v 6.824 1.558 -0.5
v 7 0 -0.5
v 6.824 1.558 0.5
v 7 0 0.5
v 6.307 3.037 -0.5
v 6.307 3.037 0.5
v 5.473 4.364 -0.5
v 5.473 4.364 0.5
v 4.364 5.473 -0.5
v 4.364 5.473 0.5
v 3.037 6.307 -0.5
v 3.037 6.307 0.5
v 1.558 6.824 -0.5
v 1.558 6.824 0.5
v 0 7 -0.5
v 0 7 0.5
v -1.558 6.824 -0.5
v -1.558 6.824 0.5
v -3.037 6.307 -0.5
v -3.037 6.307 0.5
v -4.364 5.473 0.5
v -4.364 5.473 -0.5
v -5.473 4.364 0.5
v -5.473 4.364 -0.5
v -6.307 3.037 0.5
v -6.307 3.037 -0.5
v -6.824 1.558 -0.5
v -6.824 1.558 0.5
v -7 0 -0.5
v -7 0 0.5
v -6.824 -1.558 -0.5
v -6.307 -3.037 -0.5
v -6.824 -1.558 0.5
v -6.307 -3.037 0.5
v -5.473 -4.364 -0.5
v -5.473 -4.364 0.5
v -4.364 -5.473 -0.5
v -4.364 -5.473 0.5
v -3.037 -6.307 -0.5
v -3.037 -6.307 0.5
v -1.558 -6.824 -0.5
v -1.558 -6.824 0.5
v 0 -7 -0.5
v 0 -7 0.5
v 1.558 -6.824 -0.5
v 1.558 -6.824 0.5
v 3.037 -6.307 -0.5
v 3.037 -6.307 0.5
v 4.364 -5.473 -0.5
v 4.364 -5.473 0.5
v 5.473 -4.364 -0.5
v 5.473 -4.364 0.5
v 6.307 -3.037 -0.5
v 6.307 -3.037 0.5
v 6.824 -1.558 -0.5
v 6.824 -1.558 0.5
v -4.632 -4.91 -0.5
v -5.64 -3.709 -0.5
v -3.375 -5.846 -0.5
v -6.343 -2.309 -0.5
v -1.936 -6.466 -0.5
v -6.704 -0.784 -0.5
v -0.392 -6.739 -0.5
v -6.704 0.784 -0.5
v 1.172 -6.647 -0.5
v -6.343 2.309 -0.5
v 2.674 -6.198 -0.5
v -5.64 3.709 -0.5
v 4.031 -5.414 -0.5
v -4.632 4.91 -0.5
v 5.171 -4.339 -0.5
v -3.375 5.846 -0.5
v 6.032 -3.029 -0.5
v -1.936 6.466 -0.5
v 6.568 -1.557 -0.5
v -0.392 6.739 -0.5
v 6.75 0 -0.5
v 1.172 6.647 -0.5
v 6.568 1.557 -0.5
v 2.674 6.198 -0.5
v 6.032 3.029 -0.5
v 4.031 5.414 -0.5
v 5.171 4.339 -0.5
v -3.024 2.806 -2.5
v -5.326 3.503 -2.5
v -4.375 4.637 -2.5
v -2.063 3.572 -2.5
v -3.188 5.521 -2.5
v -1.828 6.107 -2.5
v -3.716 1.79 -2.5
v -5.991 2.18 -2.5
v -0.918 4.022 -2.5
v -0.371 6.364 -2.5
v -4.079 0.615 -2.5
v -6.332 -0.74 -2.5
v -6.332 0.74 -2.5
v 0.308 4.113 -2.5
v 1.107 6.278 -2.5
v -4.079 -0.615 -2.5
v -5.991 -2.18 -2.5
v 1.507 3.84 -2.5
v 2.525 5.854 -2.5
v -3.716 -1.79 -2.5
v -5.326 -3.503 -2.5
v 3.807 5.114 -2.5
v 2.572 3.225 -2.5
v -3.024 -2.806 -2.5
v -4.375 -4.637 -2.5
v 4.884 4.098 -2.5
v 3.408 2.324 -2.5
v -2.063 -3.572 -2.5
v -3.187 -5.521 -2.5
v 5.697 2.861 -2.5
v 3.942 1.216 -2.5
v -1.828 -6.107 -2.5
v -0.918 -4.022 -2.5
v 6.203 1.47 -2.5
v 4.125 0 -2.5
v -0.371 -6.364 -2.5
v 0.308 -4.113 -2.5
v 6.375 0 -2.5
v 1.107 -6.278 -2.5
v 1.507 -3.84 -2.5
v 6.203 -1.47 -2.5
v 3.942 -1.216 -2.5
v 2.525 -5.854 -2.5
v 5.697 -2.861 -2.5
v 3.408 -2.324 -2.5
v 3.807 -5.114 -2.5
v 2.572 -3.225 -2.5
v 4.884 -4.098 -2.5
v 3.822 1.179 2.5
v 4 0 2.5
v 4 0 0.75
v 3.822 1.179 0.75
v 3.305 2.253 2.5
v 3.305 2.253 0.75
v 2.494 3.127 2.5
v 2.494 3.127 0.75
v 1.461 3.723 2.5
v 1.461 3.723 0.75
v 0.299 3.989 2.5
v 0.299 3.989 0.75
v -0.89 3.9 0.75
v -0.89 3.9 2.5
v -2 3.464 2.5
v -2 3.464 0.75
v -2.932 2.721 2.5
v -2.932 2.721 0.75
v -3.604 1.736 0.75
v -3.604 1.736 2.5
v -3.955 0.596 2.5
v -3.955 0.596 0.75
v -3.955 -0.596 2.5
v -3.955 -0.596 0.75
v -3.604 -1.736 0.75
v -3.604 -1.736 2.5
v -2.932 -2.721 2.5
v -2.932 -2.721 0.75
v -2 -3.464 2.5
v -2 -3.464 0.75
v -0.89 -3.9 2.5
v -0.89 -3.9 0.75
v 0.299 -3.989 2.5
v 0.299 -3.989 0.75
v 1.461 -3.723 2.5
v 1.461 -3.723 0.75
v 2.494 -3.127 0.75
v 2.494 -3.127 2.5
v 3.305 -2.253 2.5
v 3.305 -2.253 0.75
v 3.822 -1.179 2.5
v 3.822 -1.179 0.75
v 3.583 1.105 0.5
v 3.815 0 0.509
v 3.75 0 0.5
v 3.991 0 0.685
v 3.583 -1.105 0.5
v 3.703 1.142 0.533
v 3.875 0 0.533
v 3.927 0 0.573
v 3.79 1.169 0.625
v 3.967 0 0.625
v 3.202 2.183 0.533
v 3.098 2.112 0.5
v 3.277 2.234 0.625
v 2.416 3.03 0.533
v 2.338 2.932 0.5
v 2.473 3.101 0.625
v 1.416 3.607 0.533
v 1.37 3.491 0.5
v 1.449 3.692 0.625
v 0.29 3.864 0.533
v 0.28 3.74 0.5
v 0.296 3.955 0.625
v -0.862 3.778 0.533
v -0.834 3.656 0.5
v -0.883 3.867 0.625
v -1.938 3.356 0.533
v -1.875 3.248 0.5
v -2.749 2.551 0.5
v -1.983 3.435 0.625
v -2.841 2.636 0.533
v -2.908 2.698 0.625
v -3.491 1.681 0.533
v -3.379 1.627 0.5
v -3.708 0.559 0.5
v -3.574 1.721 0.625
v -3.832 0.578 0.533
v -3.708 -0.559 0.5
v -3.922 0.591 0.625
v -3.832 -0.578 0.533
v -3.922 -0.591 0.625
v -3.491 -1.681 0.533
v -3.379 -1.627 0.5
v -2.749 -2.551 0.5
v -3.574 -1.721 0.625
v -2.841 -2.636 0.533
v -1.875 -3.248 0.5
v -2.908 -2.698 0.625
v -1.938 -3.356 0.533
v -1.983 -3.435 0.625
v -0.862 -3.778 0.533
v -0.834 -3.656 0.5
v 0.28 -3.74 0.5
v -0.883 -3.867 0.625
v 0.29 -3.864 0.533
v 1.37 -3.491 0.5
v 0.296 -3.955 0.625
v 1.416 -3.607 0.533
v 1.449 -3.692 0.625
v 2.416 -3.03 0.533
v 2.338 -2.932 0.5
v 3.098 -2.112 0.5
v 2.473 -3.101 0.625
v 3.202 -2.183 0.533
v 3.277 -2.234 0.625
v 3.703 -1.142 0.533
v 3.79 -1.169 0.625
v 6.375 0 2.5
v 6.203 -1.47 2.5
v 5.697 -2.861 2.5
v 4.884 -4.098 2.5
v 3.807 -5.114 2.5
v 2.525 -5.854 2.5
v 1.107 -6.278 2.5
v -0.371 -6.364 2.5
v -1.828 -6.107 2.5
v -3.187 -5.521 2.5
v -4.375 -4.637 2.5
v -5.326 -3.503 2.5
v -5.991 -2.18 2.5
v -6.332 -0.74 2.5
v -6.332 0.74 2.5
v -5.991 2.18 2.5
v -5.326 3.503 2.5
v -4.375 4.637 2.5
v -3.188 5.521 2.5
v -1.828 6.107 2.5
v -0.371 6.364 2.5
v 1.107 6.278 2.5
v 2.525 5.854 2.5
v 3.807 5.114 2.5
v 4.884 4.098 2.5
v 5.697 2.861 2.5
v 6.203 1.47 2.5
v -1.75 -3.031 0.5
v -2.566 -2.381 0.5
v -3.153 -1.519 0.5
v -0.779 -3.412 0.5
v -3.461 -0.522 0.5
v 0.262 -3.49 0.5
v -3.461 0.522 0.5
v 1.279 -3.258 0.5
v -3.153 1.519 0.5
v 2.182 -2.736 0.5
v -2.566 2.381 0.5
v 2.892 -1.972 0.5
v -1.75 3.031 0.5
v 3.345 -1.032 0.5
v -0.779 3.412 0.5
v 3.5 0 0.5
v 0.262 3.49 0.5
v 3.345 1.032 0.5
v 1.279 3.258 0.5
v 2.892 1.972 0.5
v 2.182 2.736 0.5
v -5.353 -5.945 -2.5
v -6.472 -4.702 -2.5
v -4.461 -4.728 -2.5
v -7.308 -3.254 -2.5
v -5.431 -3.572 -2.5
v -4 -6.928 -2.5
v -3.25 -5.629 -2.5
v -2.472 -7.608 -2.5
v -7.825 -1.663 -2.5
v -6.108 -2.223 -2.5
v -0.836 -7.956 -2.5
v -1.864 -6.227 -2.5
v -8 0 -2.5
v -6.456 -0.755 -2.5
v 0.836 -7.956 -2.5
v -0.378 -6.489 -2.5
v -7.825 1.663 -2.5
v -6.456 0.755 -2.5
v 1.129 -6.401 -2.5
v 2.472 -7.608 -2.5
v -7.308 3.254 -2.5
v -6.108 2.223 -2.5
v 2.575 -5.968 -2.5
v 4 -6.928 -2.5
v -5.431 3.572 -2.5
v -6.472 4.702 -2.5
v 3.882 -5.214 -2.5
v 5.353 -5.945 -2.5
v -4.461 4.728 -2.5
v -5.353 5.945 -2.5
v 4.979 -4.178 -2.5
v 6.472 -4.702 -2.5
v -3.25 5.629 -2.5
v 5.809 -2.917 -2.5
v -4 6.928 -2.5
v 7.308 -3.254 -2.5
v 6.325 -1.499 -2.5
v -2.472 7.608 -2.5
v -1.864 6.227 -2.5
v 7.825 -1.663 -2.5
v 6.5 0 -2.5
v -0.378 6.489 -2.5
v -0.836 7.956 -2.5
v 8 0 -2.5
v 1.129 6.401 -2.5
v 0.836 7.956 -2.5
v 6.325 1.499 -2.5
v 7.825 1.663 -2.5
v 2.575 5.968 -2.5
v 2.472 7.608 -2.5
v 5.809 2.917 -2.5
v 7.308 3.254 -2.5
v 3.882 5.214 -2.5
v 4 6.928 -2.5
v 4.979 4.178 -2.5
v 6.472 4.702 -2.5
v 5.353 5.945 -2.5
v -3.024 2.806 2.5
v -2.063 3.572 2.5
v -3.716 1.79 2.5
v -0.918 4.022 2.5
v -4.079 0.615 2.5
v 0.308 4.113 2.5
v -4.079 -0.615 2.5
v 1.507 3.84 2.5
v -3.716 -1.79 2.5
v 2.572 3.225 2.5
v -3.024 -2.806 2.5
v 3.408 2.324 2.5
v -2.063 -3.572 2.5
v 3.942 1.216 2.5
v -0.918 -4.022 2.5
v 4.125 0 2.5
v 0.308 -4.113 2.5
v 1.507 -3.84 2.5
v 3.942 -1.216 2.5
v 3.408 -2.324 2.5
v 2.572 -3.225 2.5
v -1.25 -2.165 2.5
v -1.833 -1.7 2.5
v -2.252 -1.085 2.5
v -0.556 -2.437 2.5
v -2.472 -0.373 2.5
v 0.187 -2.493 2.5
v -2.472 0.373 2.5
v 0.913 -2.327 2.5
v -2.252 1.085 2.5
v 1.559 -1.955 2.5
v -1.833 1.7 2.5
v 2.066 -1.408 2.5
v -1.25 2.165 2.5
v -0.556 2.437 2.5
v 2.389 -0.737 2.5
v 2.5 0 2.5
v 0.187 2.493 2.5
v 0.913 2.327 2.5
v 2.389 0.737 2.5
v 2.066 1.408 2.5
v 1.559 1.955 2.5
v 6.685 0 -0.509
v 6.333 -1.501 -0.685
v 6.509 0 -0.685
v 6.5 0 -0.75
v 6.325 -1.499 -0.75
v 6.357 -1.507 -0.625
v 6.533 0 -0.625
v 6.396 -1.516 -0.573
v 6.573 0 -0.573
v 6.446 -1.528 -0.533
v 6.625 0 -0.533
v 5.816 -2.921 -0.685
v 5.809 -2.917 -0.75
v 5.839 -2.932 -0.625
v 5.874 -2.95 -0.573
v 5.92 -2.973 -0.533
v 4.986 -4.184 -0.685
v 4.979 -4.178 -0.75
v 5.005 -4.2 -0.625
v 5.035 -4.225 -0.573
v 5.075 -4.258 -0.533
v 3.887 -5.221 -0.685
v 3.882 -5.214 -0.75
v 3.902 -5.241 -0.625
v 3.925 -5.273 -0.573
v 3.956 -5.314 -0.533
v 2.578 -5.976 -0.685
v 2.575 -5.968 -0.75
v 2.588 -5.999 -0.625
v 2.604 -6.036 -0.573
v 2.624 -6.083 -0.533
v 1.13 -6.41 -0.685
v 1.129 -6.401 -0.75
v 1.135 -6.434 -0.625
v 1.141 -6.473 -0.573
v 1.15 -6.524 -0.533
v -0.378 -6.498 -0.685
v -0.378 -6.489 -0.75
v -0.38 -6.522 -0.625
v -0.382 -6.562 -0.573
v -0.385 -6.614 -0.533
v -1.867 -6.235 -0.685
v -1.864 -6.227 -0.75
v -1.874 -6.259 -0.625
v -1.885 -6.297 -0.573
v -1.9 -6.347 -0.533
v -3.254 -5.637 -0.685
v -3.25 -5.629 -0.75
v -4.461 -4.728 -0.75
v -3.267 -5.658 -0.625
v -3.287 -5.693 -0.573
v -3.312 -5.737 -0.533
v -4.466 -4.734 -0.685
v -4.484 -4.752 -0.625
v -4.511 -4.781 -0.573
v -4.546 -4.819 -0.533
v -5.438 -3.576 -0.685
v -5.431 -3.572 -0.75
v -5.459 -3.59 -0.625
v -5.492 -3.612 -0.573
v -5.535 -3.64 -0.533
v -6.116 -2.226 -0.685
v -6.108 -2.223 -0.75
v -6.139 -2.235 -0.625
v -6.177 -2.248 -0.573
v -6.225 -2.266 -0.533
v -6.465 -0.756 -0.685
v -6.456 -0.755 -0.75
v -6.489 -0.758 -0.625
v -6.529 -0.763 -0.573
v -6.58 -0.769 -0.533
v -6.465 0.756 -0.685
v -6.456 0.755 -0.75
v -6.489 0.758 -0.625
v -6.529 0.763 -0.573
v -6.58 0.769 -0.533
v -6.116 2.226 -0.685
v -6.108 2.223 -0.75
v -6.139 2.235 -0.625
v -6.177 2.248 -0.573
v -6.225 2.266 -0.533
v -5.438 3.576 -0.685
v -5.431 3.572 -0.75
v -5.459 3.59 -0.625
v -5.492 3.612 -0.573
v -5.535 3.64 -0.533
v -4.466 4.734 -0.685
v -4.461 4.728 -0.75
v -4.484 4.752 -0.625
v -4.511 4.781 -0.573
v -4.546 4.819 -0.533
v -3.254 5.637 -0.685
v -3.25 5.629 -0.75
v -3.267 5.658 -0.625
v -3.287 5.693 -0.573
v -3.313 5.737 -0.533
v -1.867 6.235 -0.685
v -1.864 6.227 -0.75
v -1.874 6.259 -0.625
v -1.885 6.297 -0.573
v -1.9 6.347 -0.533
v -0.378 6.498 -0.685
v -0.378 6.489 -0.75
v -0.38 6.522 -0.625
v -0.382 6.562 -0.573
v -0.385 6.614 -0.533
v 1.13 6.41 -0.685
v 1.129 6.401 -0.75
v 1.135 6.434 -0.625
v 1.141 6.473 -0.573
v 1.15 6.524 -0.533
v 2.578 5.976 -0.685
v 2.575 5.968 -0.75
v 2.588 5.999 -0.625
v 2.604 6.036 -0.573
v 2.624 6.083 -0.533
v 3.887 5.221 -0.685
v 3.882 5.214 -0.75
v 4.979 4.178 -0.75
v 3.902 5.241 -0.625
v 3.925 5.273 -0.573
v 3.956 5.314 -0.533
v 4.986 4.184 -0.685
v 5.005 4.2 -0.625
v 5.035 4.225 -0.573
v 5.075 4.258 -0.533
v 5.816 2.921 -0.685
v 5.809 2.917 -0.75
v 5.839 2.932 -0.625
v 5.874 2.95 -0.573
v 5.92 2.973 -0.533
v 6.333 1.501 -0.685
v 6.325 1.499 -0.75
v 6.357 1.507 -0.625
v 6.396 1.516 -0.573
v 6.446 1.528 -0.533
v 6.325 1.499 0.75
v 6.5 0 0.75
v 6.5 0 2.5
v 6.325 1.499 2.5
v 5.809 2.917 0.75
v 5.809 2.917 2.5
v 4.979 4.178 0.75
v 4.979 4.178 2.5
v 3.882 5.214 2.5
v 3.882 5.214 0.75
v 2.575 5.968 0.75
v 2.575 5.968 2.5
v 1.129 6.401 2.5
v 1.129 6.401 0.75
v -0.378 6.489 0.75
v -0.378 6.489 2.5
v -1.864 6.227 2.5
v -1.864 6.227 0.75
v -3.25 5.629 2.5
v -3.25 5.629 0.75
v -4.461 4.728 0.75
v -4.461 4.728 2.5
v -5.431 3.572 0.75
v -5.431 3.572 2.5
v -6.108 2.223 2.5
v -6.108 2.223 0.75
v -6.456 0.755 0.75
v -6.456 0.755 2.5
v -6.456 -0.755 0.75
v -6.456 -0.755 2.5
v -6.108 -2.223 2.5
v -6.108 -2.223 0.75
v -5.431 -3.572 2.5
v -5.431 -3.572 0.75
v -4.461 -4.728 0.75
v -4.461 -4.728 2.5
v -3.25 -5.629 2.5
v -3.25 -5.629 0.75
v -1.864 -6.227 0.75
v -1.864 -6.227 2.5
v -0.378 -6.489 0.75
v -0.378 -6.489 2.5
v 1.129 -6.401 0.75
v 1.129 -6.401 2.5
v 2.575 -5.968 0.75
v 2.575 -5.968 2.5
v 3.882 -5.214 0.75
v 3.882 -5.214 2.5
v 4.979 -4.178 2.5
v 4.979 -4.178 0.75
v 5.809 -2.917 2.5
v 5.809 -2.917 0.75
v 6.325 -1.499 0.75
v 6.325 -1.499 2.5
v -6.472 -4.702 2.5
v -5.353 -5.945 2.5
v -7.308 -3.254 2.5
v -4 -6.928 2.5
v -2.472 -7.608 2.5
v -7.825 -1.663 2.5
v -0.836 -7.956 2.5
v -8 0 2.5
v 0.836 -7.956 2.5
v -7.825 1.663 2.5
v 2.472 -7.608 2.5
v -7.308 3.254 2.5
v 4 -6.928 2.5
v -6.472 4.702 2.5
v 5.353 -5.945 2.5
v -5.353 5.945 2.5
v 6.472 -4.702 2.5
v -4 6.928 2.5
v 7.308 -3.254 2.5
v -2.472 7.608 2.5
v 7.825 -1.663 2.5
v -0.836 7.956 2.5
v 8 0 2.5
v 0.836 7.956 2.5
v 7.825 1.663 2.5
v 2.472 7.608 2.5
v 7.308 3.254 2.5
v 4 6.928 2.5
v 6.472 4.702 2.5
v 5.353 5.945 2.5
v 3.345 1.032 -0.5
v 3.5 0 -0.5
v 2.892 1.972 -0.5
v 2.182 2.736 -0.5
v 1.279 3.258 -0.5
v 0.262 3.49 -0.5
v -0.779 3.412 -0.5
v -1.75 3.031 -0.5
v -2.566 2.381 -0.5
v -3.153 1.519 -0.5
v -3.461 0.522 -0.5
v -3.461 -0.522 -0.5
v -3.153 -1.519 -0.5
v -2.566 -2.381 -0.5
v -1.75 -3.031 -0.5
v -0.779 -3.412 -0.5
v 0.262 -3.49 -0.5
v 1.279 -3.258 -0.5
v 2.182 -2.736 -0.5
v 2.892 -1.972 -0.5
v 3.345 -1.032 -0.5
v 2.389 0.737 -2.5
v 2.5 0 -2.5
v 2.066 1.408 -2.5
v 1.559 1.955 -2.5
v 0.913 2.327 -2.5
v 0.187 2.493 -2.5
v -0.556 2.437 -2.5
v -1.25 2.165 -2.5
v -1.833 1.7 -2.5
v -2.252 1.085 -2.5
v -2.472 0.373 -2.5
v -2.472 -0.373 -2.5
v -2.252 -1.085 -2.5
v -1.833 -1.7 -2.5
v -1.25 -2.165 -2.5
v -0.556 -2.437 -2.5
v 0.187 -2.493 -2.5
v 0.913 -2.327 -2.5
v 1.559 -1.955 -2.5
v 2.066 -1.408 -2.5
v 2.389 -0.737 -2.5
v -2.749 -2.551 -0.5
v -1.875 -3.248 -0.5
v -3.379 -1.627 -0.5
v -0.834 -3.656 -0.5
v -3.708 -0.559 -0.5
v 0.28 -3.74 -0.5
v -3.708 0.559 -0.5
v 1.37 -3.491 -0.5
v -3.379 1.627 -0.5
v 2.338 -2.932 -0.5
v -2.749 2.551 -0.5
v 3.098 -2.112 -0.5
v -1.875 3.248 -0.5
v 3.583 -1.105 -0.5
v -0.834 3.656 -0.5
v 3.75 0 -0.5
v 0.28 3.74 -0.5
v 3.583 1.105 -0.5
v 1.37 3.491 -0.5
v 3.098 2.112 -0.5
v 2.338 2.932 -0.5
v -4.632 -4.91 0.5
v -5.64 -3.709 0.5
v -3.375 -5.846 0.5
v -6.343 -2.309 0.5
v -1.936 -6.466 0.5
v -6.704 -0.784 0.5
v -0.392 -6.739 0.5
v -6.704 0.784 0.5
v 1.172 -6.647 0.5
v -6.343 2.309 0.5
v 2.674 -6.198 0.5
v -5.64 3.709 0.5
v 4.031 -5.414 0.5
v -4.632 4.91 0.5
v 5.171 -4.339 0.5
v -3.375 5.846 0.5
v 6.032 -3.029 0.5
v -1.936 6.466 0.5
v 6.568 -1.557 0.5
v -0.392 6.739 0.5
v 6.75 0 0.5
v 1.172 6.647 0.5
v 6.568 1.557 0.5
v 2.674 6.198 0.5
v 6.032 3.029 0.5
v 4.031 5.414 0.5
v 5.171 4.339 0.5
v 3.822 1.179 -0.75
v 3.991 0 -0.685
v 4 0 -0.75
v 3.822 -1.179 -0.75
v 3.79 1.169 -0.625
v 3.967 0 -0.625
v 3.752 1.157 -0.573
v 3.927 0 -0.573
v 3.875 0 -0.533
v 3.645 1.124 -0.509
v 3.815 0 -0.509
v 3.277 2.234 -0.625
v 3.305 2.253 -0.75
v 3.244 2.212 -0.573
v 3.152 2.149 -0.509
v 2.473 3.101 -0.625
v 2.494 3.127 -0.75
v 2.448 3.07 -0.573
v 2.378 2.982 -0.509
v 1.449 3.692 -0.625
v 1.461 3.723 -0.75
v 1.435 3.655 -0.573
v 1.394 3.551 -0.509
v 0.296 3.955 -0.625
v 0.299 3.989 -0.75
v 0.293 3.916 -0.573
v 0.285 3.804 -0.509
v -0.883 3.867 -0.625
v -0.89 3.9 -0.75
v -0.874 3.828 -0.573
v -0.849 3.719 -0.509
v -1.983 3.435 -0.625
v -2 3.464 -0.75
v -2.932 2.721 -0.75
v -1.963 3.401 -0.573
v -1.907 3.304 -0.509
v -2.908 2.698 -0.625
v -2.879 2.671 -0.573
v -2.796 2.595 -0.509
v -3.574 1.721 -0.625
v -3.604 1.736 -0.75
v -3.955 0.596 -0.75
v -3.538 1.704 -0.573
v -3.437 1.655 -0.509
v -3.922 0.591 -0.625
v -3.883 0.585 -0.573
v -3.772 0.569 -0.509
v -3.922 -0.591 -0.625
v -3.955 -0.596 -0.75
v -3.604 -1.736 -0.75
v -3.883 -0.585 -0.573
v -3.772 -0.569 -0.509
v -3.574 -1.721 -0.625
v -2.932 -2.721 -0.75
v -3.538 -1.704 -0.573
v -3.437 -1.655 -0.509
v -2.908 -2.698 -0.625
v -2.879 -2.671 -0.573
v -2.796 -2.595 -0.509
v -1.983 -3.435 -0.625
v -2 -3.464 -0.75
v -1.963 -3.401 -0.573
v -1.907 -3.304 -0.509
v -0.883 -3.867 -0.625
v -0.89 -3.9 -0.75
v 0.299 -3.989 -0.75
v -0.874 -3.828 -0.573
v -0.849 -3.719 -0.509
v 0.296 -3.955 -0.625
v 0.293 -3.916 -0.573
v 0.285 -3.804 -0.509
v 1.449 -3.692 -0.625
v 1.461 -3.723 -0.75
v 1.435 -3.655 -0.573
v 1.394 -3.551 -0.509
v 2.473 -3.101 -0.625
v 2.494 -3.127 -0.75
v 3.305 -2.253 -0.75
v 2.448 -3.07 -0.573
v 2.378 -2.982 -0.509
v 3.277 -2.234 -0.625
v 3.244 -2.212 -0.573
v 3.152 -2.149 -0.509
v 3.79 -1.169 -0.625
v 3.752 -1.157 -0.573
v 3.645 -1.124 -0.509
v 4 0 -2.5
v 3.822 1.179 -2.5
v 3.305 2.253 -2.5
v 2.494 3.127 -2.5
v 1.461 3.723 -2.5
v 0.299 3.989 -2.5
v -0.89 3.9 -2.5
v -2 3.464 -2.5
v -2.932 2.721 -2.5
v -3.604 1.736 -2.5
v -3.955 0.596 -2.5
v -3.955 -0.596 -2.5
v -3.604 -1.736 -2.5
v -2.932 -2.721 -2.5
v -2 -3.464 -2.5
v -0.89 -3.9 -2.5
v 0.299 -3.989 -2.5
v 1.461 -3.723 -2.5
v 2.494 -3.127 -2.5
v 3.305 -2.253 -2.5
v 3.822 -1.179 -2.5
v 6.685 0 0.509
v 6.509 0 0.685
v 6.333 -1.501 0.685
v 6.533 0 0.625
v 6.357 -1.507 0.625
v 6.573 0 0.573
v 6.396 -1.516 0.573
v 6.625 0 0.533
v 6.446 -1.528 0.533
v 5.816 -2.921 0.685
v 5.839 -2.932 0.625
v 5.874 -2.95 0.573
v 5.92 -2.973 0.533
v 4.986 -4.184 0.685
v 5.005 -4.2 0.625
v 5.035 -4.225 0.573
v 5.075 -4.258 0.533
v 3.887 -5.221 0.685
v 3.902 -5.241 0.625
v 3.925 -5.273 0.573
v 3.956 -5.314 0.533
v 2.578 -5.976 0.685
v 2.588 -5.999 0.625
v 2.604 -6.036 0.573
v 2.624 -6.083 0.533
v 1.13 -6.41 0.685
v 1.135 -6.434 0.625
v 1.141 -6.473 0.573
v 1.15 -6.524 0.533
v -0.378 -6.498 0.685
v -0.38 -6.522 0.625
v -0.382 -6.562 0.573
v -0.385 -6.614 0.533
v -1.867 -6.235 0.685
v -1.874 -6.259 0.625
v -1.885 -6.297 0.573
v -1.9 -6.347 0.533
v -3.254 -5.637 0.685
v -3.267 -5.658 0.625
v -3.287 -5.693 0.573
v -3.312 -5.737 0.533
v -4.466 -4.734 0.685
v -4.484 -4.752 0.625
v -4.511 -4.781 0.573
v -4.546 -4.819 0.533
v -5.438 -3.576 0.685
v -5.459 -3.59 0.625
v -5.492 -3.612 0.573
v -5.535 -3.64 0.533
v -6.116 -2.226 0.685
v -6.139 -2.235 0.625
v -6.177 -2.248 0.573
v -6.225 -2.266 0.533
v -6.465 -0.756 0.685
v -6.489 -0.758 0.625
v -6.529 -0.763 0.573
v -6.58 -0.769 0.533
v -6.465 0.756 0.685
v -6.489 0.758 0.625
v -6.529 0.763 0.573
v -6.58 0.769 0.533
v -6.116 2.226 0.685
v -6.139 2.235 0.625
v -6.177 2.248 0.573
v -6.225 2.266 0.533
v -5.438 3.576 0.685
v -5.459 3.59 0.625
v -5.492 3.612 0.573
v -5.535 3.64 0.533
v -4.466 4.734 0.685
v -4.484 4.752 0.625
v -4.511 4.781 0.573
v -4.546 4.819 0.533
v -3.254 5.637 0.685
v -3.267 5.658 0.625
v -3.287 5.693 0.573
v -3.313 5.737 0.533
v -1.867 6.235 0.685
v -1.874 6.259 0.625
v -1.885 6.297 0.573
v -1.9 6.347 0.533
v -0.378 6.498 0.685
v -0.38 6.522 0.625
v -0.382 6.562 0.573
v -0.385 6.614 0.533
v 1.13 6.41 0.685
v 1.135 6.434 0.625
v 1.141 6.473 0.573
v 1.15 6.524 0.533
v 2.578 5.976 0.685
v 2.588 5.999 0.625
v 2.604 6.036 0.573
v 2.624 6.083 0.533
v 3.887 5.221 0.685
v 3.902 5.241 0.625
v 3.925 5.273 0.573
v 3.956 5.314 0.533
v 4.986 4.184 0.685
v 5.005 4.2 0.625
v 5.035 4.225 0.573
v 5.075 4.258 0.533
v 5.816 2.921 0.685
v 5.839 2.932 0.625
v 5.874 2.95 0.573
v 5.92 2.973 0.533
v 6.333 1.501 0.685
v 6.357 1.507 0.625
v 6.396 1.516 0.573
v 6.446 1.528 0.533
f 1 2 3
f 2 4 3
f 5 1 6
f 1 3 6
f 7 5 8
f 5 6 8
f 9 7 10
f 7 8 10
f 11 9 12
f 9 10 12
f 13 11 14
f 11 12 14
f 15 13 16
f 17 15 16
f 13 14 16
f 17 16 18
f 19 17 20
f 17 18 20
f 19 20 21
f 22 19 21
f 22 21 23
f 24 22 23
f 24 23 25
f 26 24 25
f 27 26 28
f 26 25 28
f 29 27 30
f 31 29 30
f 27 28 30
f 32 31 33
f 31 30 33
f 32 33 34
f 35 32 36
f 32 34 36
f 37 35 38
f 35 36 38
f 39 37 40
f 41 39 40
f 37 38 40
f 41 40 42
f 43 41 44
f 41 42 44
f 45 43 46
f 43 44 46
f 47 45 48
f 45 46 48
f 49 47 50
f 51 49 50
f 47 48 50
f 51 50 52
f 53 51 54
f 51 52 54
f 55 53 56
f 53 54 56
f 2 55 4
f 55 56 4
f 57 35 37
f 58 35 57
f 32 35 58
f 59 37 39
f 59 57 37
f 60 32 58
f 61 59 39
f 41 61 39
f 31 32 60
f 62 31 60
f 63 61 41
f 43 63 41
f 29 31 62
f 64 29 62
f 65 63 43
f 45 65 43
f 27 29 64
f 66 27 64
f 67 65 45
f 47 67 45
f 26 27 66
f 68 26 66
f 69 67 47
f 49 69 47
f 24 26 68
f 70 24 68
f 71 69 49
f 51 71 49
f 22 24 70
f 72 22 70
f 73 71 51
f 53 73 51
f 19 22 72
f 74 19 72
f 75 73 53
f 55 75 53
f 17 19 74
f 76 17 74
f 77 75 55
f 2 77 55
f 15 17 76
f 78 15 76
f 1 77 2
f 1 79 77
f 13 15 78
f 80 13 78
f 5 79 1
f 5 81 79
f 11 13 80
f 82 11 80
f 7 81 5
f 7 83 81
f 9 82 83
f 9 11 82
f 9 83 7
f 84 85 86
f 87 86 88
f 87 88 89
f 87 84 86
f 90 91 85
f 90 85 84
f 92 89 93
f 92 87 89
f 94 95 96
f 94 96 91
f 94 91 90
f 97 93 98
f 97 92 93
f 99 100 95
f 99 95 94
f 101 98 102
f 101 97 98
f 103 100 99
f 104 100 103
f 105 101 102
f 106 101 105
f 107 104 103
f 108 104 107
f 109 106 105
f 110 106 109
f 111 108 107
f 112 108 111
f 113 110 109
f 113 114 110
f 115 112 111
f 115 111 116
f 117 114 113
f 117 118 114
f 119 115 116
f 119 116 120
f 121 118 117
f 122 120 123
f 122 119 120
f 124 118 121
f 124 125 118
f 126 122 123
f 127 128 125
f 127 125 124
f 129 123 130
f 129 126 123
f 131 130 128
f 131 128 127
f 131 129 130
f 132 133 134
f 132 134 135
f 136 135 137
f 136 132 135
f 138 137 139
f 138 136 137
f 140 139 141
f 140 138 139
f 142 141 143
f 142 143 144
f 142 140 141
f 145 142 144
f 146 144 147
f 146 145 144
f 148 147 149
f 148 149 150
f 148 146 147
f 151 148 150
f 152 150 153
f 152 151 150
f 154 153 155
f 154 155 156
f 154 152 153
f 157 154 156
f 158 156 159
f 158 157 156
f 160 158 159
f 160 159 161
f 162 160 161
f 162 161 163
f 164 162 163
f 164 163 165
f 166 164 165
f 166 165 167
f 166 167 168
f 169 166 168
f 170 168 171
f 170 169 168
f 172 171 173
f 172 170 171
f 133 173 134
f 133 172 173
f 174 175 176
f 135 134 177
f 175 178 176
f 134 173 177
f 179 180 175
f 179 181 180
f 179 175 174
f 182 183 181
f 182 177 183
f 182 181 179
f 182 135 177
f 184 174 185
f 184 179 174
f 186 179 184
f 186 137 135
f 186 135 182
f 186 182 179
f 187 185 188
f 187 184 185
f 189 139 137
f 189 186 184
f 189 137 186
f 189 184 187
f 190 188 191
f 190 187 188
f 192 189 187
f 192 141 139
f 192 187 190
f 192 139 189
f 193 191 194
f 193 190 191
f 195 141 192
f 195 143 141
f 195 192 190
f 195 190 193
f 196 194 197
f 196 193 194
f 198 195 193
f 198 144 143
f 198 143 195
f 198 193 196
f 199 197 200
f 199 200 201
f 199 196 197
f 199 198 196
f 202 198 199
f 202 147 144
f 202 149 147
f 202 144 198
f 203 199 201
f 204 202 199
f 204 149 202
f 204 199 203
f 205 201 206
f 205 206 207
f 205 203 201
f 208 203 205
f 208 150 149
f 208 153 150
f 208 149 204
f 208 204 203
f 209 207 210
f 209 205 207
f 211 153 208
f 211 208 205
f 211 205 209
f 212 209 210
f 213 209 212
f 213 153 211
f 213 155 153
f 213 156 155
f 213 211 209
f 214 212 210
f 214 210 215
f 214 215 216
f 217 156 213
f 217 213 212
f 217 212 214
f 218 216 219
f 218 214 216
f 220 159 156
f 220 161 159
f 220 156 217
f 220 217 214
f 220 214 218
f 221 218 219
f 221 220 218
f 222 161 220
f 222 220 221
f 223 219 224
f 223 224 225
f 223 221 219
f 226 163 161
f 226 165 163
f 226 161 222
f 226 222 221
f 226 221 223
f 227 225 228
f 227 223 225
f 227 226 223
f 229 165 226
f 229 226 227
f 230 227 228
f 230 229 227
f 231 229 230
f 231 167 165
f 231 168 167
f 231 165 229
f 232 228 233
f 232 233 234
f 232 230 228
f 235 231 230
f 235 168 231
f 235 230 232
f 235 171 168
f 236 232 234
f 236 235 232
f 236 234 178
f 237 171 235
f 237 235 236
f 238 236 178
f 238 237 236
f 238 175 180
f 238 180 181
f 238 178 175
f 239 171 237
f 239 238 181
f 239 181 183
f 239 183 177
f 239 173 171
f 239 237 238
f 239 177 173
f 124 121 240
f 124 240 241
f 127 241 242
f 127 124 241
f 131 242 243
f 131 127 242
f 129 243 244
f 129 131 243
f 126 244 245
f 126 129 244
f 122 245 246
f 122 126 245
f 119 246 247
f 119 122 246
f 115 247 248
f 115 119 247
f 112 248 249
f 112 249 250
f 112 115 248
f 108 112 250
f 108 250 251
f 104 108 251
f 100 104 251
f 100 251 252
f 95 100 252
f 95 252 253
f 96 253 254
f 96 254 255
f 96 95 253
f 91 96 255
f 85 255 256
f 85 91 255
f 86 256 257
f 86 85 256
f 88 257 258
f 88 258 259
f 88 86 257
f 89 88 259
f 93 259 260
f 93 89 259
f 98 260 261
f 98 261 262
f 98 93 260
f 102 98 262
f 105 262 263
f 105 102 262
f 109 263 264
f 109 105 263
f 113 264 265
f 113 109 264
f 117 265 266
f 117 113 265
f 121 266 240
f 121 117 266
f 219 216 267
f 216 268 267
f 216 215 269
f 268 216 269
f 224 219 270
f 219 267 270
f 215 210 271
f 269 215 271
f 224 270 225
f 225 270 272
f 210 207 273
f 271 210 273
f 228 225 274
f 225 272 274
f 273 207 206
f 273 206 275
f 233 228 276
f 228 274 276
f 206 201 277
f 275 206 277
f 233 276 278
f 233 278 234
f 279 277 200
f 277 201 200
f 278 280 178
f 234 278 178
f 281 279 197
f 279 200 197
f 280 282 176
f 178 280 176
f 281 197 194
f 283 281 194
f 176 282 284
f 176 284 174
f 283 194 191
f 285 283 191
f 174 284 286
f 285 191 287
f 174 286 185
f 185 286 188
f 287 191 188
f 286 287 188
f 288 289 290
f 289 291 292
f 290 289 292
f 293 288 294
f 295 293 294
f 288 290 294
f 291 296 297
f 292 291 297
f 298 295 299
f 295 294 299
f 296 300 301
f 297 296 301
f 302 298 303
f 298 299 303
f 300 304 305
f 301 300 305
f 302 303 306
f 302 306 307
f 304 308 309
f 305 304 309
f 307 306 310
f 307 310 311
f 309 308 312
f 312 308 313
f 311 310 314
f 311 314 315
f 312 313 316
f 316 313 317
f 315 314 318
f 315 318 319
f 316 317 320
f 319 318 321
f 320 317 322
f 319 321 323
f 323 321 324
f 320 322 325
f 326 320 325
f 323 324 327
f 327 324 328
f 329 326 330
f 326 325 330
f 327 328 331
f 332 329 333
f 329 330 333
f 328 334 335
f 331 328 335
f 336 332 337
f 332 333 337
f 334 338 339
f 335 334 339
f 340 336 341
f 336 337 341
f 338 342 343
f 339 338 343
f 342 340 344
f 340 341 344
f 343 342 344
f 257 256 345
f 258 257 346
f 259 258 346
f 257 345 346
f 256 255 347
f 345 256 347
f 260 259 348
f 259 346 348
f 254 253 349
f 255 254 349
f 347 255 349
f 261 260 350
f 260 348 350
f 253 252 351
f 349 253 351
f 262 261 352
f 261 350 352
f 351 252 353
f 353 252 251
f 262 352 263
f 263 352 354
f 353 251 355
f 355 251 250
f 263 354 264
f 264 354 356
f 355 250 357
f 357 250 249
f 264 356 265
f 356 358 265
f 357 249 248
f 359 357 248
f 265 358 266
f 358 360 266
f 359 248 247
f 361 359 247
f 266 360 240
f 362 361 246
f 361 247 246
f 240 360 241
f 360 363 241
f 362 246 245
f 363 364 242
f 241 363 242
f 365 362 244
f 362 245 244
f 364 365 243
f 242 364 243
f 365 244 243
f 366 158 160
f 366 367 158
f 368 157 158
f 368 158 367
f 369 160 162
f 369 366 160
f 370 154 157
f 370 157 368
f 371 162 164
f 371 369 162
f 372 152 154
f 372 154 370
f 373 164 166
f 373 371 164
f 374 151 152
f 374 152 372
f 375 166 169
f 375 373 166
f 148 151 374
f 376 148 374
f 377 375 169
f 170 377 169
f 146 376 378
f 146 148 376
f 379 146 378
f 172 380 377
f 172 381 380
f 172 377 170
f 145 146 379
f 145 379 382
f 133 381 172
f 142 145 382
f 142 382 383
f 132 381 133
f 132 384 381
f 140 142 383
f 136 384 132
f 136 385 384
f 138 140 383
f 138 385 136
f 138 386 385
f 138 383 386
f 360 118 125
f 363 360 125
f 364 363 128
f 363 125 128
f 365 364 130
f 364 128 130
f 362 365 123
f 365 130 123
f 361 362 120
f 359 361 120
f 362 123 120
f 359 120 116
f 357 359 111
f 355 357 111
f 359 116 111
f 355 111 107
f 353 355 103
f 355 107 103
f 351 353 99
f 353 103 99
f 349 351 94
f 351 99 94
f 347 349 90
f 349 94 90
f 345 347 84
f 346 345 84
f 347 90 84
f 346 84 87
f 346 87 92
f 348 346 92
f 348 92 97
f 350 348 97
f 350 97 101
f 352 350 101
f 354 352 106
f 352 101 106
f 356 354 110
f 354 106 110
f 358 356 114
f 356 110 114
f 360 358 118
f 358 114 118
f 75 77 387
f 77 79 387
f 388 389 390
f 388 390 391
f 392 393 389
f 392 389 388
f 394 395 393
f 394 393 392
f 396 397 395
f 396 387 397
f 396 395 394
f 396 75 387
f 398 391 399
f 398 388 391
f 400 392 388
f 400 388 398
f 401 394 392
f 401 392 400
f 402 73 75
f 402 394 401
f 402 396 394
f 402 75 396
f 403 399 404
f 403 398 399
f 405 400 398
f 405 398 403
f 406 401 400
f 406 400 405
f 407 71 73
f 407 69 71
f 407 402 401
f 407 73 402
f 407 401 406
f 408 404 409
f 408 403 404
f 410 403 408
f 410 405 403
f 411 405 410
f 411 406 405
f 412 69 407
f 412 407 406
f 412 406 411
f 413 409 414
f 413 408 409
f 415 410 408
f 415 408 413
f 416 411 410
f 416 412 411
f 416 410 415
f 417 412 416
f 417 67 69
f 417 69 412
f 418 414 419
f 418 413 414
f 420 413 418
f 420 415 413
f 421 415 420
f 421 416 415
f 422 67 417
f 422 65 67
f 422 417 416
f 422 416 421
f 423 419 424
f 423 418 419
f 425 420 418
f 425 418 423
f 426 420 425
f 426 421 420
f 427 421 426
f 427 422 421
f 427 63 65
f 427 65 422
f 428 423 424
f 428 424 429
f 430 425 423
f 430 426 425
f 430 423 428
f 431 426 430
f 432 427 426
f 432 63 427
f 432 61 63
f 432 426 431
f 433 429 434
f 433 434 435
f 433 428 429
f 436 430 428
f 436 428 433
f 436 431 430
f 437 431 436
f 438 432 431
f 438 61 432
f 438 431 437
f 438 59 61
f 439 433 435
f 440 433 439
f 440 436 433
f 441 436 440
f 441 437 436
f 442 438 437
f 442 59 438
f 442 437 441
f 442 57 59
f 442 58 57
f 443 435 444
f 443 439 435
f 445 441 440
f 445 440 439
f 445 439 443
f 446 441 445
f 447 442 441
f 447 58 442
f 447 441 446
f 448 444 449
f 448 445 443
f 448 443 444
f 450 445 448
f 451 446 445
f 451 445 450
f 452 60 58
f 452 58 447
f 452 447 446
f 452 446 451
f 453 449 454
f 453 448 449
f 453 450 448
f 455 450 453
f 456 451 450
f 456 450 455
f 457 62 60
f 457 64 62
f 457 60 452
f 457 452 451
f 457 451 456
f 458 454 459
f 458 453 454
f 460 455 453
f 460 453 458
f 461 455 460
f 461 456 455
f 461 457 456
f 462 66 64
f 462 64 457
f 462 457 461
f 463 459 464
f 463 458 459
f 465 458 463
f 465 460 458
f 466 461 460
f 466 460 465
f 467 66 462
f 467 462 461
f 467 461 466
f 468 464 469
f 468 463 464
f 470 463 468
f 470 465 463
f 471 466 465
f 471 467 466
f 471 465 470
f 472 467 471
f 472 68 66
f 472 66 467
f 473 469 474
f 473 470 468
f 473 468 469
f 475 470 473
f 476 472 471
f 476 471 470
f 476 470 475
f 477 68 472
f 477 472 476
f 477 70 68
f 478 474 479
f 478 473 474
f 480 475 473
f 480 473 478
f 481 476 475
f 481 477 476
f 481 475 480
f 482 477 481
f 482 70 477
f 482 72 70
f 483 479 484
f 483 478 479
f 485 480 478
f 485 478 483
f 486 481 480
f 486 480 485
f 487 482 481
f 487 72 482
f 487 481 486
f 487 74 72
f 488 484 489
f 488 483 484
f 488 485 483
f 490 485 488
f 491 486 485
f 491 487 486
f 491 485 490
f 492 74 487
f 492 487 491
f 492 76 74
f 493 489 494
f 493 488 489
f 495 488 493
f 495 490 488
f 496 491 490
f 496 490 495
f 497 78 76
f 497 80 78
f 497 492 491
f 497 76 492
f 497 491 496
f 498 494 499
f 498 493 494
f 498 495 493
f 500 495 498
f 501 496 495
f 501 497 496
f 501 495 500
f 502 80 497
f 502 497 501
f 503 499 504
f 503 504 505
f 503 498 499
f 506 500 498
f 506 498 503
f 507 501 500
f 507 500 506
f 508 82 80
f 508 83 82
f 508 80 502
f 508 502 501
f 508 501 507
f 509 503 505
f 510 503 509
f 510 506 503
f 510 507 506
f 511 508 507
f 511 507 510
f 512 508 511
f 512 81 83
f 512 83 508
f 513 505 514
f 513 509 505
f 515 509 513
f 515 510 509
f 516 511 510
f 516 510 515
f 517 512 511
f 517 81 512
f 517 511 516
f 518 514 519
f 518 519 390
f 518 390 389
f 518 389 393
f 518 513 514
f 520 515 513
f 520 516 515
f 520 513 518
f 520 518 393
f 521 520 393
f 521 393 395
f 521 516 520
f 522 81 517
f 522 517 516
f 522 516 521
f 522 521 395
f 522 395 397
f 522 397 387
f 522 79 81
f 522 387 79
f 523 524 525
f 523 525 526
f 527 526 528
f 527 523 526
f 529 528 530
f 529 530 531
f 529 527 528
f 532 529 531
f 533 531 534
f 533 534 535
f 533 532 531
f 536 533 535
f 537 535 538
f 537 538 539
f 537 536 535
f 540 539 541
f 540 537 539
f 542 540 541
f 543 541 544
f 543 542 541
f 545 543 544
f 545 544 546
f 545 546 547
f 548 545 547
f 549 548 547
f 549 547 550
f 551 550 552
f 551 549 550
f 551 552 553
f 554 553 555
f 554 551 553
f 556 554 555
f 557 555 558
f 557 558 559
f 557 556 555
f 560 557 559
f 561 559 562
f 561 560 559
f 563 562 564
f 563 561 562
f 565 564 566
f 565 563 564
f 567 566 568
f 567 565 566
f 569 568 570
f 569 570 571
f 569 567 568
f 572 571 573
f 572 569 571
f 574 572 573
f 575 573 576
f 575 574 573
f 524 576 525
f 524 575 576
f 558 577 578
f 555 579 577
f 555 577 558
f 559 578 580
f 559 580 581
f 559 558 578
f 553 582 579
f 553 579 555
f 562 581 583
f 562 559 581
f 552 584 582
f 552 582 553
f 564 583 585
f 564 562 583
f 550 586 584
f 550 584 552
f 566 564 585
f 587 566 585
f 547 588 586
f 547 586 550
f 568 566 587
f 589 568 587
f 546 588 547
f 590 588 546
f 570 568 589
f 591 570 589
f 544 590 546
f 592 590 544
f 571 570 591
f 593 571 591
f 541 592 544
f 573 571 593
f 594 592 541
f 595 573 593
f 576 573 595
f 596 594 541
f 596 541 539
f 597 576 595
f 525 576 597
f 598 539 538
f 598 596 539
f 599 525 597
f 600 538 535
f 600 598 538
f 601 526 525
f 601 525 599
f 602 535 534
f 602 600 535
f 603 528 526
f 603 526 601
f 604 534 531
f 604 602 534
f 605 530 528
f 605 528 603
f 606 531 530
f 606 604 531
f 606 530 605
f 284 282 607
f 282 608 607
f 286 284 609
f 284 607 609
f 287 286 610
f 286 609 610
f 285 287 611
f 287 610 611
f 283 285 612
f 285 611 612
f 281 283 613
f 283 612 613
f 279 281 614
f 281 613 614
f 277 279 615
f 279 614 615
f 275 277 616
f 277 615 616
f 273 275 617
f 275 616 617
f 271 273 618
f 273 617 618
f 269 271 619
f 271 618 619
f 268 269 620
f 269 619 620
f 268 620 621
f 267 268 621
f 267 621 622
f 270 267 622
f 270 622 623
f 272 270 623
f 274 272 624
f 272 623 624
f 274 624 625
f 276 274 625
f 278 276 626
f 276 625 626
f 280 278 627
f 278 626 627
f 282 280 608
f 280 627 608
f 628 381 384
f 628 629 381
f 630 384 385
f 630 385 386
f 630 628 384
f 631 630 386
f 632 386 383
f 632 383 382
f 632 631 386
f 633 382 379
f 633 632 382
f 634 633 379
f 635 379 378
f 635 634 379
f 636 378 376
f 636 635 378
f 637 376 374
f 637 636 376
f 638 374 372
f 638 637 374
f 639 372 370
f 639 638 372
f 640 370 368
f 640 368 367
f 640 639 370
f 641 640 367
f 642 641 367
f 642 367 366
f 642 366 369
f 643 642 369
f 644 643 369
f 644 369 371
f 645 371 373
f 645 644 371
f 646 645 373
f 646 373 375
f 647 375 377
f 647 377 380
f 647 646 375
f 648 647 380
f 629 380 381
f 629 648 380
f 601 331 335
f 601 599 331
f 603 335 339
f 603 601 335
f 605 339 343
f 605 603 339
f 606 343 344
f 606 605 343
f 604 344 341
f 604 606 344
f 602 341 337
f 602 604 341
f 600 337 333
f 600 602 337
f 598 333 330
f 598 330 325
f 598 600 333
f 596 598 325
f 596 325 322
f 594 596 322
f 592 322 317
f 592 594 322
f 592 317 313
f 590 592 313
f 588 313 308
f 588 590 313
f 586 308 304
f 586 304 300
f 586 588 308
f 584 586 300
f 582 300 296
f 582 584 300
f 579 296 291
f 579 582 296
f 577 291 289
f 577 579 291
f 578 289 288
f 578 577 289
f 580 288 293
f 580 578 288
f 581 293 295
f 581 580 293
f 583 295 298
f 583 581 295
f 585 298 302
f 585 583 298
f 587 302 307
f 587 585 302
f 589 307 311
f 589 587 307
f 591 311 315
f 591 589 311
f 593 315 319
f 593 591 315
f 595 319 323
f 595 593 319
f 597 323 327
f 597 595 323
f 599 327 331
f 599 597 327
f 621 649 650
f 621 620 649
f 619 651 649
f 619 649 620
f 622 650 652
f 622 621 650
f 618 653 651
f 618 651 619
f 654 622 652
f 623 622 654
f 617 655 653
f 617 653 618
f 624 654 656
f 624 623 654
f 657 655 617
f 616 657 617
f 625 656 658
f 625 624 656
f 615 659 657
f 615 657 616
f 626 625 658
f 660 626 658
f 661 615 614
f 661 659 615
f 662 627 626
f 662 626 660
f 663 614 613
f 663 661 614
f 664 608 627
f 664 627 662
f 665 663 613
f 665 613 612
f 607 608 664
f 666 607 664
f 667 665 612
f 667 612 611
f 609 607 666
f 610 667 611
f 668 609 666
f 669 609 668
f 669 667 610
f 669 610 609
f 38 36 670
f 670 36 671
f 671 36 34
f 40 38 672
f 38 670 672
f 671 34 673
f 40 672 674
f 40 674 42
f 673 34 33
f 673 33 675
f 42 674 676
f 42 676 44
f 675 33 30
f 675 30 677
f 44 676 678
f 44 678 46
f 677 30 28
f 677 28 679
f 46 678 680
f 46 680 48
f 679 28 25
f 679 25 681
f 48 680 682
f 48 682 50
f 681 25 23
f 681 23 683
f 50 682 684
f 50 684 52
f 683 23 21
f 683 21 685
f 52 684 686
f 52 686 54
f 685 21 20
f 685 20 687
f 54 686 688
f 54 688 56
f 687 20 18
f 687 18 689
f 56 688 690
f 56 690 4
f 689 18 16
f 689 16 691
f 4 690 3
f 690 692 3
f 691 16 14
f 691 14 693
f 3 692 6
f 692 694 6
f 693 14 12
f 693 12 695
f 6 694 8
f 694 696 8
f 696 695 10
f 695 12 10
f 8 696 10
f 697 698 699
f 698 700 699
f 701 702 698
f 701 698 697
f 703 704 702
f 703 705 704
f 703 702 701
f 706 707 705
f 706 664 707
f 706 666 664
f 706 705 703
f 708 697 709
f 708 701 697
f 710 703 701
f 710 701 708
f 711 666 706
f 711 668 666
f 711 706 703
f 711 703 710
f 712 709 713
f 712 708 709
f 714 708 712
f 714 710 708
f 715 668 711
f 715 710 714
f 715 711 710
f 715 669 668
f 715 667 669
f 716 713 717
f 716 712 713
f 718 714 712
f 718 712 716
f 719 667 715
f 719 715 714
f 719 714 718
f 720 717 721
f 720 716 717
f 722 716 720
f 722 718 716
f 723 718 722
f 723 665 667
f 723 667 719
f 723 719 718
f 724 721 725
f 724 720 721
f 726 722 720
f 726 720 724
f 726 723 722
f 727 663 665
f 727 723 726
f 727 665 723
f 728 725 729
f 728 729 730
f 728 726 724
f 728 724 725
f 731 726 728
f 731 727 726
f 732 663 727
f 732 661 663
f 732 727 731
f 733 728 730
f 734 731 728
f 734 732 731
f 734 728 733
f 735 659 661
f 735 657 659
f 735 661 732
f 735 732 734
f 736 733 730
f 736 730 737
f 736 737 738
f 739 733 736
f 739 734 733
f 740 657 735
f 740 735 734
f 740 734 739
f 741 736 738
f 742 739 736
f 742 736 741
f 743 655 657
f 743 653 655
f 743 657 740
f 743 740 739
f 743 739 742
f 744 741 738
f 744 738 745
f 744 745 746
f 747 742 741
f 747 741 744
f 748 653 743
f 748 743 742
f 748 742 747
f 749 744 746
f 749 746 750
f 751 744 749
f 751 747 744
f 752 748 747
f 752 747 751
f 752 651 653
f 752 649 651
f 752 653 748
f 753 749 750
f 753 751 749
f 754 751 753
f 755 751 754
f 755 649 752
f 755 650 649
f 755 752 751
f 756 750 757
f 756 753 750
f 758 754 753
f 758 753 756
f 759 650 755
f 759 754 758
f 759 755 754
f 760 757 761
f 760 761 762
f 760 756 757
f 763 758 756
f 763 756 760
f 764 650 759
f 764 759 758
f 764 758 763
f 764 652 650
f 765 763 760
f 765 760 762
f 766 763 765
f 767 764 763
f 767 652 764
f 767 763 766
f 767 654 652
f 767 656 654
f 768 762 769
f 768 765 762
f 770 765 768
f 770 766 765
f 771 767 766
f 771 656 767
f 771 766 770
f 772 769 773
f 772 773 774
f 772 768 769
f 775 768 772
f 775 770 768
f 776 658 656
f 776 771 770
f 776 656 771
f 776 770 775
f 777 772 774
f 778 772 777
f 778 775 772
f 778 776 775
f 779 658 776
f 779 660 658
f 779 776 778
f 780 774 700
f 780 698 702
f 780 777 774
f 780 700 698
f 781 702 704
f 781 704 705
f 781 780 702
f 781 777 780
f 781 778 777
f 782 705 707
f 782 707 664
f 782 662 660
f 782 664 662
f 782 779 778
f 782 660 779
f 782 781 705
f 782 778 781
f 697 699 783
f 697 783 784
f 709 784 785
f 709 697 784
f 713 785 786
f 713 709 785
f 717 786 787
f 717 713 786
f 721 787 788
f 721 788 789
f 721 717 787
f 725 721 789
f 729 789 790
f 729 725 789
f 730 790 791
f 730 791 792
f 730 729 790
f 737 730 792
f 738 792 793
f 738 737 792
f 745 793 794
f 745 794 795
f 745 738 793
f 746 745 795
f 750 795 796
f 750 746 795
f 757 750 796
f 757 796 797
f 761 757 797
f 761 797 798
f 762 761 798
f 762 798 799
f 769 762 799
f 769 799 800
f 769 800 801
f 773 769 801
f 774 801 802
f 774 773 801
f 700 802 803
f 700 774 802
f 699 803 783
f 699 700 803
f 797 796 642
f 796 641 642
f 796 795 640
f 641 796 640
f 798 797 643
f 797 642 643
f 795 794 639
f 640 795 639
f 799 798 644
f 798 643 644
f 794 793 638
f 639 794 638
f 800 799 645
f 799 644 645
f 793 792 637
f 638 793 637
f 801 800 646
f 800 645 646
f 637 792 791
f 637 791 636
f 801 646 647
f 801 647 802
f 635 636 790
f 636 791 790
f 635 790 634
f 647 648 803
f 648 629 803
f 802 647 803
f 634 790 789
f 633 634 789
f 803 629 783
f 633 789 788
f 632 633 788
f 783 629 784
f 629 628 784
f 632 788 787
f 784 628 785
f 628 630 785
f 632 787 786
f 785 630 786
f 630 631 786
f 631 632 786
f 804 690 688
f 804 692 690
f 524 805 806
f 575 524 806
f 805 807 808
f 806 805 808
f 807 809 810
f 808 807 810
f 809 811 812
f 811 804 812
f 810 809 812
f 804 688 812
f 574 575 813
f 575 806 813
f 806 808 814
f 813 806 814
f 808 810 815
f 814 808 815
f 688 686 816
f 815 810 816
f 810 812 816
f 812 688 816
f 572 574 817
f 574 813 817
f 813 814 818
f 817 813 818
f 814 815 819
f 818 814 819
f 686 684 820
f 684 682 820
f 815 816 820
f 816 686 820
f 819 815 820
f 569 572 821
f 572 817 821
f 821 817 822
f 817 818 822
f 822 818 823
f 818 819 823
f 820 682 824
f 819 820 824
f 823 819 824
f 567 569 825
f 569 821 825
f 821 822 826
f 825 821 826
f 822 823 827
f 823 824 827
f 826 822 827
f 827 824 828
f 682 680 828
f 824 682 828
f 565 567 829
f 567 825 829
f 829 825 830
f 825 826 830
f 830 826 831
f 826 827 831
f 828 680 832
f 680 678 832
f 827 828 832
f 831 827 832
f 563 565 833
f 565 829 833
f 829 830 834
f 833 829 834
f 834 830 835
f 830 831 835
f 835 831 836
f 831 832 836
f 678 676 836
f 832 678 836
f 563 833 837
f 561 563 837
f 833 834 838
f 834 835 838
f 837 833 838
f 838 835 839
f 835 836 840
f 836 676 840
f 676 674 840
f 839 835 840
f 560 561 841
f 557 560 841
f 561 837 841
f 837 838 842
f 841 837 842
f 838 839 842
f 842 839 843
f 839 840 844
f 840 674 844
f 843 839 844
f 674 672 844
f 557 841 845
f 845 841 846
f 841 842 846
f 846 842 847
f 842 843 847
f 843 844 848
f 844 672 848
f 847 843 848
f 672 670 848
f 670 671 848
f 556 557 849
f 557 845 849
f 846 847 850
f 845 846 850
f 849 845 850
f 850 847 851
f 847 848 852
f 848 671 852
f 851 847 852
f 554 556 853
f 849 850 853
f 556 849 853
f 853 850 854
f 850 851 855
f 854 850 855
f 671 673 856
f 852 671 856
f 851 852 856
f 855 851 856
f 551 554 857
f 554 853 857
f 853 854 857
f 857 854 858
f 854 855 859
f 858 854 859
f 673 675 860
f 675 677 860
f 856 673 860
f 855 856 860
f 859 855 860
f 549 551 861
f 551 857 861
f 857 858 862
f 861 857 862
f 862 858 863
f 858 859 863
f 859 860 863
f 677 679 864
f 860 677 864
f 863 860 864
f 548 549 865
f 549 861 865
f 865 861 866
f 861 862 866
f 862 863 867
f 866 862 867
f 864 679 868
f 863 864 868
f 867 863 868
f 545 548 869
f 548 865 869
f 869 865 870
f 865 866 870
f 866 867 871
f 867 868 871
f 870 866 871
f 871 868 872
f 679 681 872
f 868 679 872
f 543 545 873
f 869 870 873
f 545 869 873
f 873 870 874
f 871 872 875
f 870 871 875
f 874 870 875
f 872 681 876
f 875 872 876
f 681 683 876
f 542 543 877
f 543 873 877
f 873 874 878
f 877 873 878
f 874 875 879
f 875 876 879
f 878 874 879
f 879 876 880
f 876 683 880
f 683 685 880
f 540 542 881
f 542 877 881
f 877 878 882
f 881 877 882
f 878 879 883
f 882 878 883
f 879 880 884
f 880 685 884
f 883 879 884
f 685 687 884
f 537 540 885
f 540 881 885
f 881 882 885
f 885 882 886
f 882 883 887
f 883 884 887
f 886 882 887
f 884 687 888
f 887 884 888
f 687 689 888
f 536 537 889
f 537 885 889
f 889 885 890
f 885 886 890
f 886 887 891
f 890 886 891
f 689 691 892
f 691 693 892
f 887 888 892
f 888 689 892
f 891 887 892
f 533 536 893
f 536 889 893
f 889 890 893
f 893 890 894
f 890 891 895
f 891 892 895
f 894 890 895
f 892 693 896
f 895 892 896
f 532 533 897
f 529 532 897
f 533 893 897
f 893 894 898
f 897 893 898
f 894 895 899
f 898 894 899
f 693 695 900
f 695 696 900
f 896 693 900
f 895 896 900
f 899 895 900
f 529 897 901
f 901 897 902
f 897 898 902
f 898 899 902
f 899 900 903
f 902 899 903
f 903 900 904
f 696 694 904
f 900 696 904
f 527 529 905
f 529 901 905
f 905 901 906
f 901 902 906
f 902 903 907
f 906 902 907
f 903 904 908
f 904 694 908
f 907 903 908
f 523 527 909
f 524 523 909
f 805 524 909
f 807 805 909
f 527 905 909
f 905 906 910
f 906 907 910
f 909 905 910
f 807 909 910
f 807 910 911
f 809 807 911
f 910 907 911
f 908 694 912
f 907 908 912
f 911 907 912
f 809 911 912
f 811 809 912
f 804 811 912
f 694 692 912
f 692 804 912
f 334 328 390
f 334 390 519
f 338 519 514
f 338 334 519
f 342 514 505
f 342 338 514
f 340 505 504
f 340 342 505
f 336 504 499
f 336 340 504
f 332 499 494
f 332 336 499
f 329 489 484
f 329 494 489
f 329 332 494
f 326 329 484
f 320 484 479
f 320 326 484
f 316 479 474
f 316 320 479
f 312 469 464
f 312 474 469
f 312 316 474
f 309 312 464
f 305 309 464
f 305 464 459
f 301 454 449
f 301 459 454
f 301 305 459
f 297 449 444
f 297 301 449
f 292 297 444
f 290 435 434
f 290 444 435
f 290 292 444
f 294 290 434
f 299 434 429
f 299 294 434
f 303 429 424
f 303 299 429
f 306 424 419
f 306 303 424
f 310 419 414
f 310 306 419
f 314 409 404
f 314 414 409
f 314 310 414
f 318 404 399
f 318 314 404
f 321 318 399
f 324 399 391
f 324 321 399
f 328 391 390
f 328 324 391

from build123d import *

# Parameters (mm, degrees)
F0_R     = 8
F0_R_2   = 6.5
F1_DEPTH = 2.5
F0_R_3   = 4
F0_R_4   = 2.5
F2_R     = 7
F2_R_2   = 3.5
F3_DEPTH = 0.5
F4_R     = 0.25
F4_2_R   = 0.25
F5_R     = 6.375
F5_R_2   = 4.125
F6_DEPTH = 5


with BuildPart() as f1:
    # F0 (on Top) → F1 (new body, symmetric)
    with BuildSketch(Plane.XY):
        Circle(F0_R)
        Circle(F0_R_2, mode=Mode.SUBTRACT)
    extrude(amount=F1_DEPTH, both=True)


with BuildPart() as f1b:
    # F0 (on Top) → F1, piece 2 (new body, symmetric)
    with BuildSketch(Plane.XY):
        Circle(F0_R_3)
        Circle(F0_R_4, mode=Mode.SUBTRACT)
    extrude(amount=F1_DEPTH, both=True)


with BuildPart() as f3_tool:
    # F2 (on Top) → F3 (new body, symmetric)
    with BuildSketch(Plane.XY):
        Circle(F2_R)
        Circle(F2_R_2, mode=Mode.SUBTRACT)
    extrude(amount=F3_DEPTH, both=True)


with BuildPart() as f1_1:
    add(f1.part)

    # F3: cut by f3_tool
    add(f3_tool.part, mode=Mode.SUBTRACT)

    # F4
    f4_edges = [f1_1.edges().sort_by_distance(p)[0] for p in [
        (-6.5, 0, 0.5),
        (-6.5, 0, -0.5),
    ]]
    fillet(f4_edges, radius=F4_R)


with BuildPart() as f1b_1:
    add(f1b.part)

    # F3: cut by f3_tool
    add(f3_tool.part, mode=Mode.SUBTRACT)

    # F4#2
    f4_2_edges = [f1b_1.edges().sort_by_distance(p)[0] for p in [
        (-4, 0, -0.5),
        (-4, 0, 0.5),
    ]]
    fillet(f4_2_edges, radius=F4_2_R)


with BuildPart() as f6:
    # F5 (on face) → F6 (new body)
    with BuildSketch(Plane(origin=(0, 0, -2.5), x_dir=(1, 0, 0), z_dir=(0, 0, -1))):
        Circle(F5_R)
        Circle(F5_R_2, mode=Mode.SUBTRACT)
    extrude(amount=-F6_DEPTH)


solid = Compound([f1_1.part, f1b_1.part, f6.part])
